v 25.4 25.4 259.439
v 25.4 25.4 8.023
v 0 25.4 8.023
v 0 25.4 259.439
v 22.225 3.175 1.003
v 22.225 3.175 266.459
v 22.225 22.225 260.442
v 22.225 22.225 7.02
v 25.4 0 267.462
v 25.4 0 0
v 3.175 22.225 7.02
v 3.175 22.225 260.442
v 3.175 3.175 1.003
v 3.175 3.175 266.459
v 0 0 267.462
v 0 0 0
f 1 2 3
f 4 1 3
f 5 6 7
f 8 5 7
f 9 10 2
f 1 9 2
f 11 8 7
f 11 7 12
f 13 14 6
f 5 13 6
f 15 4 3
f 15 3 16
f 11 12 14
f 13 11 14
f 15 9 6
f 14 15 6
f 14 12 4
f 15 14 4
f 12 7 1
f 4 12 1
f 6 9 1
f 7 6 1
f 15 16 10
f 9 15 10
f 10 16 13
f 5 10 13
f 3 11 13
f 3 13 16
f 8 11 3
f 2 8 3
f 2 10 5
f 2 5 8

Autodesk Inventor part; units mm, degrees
ref_plane "YZ Plane" through (0, 0, 0) normal (1, 0, 0) x (0, 1, 0)
ref_plane "XZ Plane" through (0, 0, 0) normal (0, 1, 0) x (-1, 0, 0)
ref_plane "XY Plane" through (0, 0, 0) normal (0, 0, 1) x (1, 0, 0)
sketch "Sketch1" plane through (0, 0, 0) normal (0, 0, 1) x (1, 0, 0)
  line L0 (0, 0) -> (25.4, 0)
  line L1 (25.4, 0) -> (25.4, 25.4)
  line L2 (25.4, 25.4) -> (0, 25.4)
  line L3 (0, 25.4) -> (0, 0)
  line L4 (0, 0) -> (0, 3.175)
  line L5 (0, 3.175) -> (3.175, 3.175)
  line L6 (3.175, 3.175) -> (22.225, 3.175)
  line L7 (22.225, 3.175) -> (22.225, 22.225)
  line L8 (22.225, 22.225) -> (3.175, 22.225)
  line L9 (3.175, 22.225) -> (3.175, 3.175)
  dimension "d0" = 25.4
  dimension "d1" = 25.4
  dimension "d2" = 3.175
  dimension "d3" = 3.175
  dimension "d4" = 19.05
  dimension "d5" = 19.05
extrude "Extrusion1" add sketch "Sketch1" along normal blind 267.462
sketch "Sketch2" plane through (25.4, 0, 0) normal (1, 0, 0) x (0, 0, -1)
  line L0 (0, 0) -> (0, 25.4) projected
  line L1 (0, 25.4) -> (-267.462, 25.4) projected
  line L2 (-267.462, 0) -> (-267.462, 25.4) projected
  line L3 (-267.462, 0) -> (-259.4388, 25.4)
  line L4 (-267.462, 0) -> (-240.825, 0) construction
  line L5 (0, 0) -> (-8.0232, 25.4)
  line L6 (0, 0) -> (26.637, 0) construction
  line L7 (-259.4388, 25.4) -> (-267.462, 25.4)
  line L8 (-267.462, 0) -> (-267.462, 25.4)
  line L9 (-8.0232, 25.4) -> (0, 25.4)
  line L10 (0, 25.4) -> (0, 0)
  dimension "d8" = 72.47
  dimension "d9" = 107.53
extrude "Extrusion2" cut sketch "Sketch2" against normal up to next
properties part number "midBrace"
